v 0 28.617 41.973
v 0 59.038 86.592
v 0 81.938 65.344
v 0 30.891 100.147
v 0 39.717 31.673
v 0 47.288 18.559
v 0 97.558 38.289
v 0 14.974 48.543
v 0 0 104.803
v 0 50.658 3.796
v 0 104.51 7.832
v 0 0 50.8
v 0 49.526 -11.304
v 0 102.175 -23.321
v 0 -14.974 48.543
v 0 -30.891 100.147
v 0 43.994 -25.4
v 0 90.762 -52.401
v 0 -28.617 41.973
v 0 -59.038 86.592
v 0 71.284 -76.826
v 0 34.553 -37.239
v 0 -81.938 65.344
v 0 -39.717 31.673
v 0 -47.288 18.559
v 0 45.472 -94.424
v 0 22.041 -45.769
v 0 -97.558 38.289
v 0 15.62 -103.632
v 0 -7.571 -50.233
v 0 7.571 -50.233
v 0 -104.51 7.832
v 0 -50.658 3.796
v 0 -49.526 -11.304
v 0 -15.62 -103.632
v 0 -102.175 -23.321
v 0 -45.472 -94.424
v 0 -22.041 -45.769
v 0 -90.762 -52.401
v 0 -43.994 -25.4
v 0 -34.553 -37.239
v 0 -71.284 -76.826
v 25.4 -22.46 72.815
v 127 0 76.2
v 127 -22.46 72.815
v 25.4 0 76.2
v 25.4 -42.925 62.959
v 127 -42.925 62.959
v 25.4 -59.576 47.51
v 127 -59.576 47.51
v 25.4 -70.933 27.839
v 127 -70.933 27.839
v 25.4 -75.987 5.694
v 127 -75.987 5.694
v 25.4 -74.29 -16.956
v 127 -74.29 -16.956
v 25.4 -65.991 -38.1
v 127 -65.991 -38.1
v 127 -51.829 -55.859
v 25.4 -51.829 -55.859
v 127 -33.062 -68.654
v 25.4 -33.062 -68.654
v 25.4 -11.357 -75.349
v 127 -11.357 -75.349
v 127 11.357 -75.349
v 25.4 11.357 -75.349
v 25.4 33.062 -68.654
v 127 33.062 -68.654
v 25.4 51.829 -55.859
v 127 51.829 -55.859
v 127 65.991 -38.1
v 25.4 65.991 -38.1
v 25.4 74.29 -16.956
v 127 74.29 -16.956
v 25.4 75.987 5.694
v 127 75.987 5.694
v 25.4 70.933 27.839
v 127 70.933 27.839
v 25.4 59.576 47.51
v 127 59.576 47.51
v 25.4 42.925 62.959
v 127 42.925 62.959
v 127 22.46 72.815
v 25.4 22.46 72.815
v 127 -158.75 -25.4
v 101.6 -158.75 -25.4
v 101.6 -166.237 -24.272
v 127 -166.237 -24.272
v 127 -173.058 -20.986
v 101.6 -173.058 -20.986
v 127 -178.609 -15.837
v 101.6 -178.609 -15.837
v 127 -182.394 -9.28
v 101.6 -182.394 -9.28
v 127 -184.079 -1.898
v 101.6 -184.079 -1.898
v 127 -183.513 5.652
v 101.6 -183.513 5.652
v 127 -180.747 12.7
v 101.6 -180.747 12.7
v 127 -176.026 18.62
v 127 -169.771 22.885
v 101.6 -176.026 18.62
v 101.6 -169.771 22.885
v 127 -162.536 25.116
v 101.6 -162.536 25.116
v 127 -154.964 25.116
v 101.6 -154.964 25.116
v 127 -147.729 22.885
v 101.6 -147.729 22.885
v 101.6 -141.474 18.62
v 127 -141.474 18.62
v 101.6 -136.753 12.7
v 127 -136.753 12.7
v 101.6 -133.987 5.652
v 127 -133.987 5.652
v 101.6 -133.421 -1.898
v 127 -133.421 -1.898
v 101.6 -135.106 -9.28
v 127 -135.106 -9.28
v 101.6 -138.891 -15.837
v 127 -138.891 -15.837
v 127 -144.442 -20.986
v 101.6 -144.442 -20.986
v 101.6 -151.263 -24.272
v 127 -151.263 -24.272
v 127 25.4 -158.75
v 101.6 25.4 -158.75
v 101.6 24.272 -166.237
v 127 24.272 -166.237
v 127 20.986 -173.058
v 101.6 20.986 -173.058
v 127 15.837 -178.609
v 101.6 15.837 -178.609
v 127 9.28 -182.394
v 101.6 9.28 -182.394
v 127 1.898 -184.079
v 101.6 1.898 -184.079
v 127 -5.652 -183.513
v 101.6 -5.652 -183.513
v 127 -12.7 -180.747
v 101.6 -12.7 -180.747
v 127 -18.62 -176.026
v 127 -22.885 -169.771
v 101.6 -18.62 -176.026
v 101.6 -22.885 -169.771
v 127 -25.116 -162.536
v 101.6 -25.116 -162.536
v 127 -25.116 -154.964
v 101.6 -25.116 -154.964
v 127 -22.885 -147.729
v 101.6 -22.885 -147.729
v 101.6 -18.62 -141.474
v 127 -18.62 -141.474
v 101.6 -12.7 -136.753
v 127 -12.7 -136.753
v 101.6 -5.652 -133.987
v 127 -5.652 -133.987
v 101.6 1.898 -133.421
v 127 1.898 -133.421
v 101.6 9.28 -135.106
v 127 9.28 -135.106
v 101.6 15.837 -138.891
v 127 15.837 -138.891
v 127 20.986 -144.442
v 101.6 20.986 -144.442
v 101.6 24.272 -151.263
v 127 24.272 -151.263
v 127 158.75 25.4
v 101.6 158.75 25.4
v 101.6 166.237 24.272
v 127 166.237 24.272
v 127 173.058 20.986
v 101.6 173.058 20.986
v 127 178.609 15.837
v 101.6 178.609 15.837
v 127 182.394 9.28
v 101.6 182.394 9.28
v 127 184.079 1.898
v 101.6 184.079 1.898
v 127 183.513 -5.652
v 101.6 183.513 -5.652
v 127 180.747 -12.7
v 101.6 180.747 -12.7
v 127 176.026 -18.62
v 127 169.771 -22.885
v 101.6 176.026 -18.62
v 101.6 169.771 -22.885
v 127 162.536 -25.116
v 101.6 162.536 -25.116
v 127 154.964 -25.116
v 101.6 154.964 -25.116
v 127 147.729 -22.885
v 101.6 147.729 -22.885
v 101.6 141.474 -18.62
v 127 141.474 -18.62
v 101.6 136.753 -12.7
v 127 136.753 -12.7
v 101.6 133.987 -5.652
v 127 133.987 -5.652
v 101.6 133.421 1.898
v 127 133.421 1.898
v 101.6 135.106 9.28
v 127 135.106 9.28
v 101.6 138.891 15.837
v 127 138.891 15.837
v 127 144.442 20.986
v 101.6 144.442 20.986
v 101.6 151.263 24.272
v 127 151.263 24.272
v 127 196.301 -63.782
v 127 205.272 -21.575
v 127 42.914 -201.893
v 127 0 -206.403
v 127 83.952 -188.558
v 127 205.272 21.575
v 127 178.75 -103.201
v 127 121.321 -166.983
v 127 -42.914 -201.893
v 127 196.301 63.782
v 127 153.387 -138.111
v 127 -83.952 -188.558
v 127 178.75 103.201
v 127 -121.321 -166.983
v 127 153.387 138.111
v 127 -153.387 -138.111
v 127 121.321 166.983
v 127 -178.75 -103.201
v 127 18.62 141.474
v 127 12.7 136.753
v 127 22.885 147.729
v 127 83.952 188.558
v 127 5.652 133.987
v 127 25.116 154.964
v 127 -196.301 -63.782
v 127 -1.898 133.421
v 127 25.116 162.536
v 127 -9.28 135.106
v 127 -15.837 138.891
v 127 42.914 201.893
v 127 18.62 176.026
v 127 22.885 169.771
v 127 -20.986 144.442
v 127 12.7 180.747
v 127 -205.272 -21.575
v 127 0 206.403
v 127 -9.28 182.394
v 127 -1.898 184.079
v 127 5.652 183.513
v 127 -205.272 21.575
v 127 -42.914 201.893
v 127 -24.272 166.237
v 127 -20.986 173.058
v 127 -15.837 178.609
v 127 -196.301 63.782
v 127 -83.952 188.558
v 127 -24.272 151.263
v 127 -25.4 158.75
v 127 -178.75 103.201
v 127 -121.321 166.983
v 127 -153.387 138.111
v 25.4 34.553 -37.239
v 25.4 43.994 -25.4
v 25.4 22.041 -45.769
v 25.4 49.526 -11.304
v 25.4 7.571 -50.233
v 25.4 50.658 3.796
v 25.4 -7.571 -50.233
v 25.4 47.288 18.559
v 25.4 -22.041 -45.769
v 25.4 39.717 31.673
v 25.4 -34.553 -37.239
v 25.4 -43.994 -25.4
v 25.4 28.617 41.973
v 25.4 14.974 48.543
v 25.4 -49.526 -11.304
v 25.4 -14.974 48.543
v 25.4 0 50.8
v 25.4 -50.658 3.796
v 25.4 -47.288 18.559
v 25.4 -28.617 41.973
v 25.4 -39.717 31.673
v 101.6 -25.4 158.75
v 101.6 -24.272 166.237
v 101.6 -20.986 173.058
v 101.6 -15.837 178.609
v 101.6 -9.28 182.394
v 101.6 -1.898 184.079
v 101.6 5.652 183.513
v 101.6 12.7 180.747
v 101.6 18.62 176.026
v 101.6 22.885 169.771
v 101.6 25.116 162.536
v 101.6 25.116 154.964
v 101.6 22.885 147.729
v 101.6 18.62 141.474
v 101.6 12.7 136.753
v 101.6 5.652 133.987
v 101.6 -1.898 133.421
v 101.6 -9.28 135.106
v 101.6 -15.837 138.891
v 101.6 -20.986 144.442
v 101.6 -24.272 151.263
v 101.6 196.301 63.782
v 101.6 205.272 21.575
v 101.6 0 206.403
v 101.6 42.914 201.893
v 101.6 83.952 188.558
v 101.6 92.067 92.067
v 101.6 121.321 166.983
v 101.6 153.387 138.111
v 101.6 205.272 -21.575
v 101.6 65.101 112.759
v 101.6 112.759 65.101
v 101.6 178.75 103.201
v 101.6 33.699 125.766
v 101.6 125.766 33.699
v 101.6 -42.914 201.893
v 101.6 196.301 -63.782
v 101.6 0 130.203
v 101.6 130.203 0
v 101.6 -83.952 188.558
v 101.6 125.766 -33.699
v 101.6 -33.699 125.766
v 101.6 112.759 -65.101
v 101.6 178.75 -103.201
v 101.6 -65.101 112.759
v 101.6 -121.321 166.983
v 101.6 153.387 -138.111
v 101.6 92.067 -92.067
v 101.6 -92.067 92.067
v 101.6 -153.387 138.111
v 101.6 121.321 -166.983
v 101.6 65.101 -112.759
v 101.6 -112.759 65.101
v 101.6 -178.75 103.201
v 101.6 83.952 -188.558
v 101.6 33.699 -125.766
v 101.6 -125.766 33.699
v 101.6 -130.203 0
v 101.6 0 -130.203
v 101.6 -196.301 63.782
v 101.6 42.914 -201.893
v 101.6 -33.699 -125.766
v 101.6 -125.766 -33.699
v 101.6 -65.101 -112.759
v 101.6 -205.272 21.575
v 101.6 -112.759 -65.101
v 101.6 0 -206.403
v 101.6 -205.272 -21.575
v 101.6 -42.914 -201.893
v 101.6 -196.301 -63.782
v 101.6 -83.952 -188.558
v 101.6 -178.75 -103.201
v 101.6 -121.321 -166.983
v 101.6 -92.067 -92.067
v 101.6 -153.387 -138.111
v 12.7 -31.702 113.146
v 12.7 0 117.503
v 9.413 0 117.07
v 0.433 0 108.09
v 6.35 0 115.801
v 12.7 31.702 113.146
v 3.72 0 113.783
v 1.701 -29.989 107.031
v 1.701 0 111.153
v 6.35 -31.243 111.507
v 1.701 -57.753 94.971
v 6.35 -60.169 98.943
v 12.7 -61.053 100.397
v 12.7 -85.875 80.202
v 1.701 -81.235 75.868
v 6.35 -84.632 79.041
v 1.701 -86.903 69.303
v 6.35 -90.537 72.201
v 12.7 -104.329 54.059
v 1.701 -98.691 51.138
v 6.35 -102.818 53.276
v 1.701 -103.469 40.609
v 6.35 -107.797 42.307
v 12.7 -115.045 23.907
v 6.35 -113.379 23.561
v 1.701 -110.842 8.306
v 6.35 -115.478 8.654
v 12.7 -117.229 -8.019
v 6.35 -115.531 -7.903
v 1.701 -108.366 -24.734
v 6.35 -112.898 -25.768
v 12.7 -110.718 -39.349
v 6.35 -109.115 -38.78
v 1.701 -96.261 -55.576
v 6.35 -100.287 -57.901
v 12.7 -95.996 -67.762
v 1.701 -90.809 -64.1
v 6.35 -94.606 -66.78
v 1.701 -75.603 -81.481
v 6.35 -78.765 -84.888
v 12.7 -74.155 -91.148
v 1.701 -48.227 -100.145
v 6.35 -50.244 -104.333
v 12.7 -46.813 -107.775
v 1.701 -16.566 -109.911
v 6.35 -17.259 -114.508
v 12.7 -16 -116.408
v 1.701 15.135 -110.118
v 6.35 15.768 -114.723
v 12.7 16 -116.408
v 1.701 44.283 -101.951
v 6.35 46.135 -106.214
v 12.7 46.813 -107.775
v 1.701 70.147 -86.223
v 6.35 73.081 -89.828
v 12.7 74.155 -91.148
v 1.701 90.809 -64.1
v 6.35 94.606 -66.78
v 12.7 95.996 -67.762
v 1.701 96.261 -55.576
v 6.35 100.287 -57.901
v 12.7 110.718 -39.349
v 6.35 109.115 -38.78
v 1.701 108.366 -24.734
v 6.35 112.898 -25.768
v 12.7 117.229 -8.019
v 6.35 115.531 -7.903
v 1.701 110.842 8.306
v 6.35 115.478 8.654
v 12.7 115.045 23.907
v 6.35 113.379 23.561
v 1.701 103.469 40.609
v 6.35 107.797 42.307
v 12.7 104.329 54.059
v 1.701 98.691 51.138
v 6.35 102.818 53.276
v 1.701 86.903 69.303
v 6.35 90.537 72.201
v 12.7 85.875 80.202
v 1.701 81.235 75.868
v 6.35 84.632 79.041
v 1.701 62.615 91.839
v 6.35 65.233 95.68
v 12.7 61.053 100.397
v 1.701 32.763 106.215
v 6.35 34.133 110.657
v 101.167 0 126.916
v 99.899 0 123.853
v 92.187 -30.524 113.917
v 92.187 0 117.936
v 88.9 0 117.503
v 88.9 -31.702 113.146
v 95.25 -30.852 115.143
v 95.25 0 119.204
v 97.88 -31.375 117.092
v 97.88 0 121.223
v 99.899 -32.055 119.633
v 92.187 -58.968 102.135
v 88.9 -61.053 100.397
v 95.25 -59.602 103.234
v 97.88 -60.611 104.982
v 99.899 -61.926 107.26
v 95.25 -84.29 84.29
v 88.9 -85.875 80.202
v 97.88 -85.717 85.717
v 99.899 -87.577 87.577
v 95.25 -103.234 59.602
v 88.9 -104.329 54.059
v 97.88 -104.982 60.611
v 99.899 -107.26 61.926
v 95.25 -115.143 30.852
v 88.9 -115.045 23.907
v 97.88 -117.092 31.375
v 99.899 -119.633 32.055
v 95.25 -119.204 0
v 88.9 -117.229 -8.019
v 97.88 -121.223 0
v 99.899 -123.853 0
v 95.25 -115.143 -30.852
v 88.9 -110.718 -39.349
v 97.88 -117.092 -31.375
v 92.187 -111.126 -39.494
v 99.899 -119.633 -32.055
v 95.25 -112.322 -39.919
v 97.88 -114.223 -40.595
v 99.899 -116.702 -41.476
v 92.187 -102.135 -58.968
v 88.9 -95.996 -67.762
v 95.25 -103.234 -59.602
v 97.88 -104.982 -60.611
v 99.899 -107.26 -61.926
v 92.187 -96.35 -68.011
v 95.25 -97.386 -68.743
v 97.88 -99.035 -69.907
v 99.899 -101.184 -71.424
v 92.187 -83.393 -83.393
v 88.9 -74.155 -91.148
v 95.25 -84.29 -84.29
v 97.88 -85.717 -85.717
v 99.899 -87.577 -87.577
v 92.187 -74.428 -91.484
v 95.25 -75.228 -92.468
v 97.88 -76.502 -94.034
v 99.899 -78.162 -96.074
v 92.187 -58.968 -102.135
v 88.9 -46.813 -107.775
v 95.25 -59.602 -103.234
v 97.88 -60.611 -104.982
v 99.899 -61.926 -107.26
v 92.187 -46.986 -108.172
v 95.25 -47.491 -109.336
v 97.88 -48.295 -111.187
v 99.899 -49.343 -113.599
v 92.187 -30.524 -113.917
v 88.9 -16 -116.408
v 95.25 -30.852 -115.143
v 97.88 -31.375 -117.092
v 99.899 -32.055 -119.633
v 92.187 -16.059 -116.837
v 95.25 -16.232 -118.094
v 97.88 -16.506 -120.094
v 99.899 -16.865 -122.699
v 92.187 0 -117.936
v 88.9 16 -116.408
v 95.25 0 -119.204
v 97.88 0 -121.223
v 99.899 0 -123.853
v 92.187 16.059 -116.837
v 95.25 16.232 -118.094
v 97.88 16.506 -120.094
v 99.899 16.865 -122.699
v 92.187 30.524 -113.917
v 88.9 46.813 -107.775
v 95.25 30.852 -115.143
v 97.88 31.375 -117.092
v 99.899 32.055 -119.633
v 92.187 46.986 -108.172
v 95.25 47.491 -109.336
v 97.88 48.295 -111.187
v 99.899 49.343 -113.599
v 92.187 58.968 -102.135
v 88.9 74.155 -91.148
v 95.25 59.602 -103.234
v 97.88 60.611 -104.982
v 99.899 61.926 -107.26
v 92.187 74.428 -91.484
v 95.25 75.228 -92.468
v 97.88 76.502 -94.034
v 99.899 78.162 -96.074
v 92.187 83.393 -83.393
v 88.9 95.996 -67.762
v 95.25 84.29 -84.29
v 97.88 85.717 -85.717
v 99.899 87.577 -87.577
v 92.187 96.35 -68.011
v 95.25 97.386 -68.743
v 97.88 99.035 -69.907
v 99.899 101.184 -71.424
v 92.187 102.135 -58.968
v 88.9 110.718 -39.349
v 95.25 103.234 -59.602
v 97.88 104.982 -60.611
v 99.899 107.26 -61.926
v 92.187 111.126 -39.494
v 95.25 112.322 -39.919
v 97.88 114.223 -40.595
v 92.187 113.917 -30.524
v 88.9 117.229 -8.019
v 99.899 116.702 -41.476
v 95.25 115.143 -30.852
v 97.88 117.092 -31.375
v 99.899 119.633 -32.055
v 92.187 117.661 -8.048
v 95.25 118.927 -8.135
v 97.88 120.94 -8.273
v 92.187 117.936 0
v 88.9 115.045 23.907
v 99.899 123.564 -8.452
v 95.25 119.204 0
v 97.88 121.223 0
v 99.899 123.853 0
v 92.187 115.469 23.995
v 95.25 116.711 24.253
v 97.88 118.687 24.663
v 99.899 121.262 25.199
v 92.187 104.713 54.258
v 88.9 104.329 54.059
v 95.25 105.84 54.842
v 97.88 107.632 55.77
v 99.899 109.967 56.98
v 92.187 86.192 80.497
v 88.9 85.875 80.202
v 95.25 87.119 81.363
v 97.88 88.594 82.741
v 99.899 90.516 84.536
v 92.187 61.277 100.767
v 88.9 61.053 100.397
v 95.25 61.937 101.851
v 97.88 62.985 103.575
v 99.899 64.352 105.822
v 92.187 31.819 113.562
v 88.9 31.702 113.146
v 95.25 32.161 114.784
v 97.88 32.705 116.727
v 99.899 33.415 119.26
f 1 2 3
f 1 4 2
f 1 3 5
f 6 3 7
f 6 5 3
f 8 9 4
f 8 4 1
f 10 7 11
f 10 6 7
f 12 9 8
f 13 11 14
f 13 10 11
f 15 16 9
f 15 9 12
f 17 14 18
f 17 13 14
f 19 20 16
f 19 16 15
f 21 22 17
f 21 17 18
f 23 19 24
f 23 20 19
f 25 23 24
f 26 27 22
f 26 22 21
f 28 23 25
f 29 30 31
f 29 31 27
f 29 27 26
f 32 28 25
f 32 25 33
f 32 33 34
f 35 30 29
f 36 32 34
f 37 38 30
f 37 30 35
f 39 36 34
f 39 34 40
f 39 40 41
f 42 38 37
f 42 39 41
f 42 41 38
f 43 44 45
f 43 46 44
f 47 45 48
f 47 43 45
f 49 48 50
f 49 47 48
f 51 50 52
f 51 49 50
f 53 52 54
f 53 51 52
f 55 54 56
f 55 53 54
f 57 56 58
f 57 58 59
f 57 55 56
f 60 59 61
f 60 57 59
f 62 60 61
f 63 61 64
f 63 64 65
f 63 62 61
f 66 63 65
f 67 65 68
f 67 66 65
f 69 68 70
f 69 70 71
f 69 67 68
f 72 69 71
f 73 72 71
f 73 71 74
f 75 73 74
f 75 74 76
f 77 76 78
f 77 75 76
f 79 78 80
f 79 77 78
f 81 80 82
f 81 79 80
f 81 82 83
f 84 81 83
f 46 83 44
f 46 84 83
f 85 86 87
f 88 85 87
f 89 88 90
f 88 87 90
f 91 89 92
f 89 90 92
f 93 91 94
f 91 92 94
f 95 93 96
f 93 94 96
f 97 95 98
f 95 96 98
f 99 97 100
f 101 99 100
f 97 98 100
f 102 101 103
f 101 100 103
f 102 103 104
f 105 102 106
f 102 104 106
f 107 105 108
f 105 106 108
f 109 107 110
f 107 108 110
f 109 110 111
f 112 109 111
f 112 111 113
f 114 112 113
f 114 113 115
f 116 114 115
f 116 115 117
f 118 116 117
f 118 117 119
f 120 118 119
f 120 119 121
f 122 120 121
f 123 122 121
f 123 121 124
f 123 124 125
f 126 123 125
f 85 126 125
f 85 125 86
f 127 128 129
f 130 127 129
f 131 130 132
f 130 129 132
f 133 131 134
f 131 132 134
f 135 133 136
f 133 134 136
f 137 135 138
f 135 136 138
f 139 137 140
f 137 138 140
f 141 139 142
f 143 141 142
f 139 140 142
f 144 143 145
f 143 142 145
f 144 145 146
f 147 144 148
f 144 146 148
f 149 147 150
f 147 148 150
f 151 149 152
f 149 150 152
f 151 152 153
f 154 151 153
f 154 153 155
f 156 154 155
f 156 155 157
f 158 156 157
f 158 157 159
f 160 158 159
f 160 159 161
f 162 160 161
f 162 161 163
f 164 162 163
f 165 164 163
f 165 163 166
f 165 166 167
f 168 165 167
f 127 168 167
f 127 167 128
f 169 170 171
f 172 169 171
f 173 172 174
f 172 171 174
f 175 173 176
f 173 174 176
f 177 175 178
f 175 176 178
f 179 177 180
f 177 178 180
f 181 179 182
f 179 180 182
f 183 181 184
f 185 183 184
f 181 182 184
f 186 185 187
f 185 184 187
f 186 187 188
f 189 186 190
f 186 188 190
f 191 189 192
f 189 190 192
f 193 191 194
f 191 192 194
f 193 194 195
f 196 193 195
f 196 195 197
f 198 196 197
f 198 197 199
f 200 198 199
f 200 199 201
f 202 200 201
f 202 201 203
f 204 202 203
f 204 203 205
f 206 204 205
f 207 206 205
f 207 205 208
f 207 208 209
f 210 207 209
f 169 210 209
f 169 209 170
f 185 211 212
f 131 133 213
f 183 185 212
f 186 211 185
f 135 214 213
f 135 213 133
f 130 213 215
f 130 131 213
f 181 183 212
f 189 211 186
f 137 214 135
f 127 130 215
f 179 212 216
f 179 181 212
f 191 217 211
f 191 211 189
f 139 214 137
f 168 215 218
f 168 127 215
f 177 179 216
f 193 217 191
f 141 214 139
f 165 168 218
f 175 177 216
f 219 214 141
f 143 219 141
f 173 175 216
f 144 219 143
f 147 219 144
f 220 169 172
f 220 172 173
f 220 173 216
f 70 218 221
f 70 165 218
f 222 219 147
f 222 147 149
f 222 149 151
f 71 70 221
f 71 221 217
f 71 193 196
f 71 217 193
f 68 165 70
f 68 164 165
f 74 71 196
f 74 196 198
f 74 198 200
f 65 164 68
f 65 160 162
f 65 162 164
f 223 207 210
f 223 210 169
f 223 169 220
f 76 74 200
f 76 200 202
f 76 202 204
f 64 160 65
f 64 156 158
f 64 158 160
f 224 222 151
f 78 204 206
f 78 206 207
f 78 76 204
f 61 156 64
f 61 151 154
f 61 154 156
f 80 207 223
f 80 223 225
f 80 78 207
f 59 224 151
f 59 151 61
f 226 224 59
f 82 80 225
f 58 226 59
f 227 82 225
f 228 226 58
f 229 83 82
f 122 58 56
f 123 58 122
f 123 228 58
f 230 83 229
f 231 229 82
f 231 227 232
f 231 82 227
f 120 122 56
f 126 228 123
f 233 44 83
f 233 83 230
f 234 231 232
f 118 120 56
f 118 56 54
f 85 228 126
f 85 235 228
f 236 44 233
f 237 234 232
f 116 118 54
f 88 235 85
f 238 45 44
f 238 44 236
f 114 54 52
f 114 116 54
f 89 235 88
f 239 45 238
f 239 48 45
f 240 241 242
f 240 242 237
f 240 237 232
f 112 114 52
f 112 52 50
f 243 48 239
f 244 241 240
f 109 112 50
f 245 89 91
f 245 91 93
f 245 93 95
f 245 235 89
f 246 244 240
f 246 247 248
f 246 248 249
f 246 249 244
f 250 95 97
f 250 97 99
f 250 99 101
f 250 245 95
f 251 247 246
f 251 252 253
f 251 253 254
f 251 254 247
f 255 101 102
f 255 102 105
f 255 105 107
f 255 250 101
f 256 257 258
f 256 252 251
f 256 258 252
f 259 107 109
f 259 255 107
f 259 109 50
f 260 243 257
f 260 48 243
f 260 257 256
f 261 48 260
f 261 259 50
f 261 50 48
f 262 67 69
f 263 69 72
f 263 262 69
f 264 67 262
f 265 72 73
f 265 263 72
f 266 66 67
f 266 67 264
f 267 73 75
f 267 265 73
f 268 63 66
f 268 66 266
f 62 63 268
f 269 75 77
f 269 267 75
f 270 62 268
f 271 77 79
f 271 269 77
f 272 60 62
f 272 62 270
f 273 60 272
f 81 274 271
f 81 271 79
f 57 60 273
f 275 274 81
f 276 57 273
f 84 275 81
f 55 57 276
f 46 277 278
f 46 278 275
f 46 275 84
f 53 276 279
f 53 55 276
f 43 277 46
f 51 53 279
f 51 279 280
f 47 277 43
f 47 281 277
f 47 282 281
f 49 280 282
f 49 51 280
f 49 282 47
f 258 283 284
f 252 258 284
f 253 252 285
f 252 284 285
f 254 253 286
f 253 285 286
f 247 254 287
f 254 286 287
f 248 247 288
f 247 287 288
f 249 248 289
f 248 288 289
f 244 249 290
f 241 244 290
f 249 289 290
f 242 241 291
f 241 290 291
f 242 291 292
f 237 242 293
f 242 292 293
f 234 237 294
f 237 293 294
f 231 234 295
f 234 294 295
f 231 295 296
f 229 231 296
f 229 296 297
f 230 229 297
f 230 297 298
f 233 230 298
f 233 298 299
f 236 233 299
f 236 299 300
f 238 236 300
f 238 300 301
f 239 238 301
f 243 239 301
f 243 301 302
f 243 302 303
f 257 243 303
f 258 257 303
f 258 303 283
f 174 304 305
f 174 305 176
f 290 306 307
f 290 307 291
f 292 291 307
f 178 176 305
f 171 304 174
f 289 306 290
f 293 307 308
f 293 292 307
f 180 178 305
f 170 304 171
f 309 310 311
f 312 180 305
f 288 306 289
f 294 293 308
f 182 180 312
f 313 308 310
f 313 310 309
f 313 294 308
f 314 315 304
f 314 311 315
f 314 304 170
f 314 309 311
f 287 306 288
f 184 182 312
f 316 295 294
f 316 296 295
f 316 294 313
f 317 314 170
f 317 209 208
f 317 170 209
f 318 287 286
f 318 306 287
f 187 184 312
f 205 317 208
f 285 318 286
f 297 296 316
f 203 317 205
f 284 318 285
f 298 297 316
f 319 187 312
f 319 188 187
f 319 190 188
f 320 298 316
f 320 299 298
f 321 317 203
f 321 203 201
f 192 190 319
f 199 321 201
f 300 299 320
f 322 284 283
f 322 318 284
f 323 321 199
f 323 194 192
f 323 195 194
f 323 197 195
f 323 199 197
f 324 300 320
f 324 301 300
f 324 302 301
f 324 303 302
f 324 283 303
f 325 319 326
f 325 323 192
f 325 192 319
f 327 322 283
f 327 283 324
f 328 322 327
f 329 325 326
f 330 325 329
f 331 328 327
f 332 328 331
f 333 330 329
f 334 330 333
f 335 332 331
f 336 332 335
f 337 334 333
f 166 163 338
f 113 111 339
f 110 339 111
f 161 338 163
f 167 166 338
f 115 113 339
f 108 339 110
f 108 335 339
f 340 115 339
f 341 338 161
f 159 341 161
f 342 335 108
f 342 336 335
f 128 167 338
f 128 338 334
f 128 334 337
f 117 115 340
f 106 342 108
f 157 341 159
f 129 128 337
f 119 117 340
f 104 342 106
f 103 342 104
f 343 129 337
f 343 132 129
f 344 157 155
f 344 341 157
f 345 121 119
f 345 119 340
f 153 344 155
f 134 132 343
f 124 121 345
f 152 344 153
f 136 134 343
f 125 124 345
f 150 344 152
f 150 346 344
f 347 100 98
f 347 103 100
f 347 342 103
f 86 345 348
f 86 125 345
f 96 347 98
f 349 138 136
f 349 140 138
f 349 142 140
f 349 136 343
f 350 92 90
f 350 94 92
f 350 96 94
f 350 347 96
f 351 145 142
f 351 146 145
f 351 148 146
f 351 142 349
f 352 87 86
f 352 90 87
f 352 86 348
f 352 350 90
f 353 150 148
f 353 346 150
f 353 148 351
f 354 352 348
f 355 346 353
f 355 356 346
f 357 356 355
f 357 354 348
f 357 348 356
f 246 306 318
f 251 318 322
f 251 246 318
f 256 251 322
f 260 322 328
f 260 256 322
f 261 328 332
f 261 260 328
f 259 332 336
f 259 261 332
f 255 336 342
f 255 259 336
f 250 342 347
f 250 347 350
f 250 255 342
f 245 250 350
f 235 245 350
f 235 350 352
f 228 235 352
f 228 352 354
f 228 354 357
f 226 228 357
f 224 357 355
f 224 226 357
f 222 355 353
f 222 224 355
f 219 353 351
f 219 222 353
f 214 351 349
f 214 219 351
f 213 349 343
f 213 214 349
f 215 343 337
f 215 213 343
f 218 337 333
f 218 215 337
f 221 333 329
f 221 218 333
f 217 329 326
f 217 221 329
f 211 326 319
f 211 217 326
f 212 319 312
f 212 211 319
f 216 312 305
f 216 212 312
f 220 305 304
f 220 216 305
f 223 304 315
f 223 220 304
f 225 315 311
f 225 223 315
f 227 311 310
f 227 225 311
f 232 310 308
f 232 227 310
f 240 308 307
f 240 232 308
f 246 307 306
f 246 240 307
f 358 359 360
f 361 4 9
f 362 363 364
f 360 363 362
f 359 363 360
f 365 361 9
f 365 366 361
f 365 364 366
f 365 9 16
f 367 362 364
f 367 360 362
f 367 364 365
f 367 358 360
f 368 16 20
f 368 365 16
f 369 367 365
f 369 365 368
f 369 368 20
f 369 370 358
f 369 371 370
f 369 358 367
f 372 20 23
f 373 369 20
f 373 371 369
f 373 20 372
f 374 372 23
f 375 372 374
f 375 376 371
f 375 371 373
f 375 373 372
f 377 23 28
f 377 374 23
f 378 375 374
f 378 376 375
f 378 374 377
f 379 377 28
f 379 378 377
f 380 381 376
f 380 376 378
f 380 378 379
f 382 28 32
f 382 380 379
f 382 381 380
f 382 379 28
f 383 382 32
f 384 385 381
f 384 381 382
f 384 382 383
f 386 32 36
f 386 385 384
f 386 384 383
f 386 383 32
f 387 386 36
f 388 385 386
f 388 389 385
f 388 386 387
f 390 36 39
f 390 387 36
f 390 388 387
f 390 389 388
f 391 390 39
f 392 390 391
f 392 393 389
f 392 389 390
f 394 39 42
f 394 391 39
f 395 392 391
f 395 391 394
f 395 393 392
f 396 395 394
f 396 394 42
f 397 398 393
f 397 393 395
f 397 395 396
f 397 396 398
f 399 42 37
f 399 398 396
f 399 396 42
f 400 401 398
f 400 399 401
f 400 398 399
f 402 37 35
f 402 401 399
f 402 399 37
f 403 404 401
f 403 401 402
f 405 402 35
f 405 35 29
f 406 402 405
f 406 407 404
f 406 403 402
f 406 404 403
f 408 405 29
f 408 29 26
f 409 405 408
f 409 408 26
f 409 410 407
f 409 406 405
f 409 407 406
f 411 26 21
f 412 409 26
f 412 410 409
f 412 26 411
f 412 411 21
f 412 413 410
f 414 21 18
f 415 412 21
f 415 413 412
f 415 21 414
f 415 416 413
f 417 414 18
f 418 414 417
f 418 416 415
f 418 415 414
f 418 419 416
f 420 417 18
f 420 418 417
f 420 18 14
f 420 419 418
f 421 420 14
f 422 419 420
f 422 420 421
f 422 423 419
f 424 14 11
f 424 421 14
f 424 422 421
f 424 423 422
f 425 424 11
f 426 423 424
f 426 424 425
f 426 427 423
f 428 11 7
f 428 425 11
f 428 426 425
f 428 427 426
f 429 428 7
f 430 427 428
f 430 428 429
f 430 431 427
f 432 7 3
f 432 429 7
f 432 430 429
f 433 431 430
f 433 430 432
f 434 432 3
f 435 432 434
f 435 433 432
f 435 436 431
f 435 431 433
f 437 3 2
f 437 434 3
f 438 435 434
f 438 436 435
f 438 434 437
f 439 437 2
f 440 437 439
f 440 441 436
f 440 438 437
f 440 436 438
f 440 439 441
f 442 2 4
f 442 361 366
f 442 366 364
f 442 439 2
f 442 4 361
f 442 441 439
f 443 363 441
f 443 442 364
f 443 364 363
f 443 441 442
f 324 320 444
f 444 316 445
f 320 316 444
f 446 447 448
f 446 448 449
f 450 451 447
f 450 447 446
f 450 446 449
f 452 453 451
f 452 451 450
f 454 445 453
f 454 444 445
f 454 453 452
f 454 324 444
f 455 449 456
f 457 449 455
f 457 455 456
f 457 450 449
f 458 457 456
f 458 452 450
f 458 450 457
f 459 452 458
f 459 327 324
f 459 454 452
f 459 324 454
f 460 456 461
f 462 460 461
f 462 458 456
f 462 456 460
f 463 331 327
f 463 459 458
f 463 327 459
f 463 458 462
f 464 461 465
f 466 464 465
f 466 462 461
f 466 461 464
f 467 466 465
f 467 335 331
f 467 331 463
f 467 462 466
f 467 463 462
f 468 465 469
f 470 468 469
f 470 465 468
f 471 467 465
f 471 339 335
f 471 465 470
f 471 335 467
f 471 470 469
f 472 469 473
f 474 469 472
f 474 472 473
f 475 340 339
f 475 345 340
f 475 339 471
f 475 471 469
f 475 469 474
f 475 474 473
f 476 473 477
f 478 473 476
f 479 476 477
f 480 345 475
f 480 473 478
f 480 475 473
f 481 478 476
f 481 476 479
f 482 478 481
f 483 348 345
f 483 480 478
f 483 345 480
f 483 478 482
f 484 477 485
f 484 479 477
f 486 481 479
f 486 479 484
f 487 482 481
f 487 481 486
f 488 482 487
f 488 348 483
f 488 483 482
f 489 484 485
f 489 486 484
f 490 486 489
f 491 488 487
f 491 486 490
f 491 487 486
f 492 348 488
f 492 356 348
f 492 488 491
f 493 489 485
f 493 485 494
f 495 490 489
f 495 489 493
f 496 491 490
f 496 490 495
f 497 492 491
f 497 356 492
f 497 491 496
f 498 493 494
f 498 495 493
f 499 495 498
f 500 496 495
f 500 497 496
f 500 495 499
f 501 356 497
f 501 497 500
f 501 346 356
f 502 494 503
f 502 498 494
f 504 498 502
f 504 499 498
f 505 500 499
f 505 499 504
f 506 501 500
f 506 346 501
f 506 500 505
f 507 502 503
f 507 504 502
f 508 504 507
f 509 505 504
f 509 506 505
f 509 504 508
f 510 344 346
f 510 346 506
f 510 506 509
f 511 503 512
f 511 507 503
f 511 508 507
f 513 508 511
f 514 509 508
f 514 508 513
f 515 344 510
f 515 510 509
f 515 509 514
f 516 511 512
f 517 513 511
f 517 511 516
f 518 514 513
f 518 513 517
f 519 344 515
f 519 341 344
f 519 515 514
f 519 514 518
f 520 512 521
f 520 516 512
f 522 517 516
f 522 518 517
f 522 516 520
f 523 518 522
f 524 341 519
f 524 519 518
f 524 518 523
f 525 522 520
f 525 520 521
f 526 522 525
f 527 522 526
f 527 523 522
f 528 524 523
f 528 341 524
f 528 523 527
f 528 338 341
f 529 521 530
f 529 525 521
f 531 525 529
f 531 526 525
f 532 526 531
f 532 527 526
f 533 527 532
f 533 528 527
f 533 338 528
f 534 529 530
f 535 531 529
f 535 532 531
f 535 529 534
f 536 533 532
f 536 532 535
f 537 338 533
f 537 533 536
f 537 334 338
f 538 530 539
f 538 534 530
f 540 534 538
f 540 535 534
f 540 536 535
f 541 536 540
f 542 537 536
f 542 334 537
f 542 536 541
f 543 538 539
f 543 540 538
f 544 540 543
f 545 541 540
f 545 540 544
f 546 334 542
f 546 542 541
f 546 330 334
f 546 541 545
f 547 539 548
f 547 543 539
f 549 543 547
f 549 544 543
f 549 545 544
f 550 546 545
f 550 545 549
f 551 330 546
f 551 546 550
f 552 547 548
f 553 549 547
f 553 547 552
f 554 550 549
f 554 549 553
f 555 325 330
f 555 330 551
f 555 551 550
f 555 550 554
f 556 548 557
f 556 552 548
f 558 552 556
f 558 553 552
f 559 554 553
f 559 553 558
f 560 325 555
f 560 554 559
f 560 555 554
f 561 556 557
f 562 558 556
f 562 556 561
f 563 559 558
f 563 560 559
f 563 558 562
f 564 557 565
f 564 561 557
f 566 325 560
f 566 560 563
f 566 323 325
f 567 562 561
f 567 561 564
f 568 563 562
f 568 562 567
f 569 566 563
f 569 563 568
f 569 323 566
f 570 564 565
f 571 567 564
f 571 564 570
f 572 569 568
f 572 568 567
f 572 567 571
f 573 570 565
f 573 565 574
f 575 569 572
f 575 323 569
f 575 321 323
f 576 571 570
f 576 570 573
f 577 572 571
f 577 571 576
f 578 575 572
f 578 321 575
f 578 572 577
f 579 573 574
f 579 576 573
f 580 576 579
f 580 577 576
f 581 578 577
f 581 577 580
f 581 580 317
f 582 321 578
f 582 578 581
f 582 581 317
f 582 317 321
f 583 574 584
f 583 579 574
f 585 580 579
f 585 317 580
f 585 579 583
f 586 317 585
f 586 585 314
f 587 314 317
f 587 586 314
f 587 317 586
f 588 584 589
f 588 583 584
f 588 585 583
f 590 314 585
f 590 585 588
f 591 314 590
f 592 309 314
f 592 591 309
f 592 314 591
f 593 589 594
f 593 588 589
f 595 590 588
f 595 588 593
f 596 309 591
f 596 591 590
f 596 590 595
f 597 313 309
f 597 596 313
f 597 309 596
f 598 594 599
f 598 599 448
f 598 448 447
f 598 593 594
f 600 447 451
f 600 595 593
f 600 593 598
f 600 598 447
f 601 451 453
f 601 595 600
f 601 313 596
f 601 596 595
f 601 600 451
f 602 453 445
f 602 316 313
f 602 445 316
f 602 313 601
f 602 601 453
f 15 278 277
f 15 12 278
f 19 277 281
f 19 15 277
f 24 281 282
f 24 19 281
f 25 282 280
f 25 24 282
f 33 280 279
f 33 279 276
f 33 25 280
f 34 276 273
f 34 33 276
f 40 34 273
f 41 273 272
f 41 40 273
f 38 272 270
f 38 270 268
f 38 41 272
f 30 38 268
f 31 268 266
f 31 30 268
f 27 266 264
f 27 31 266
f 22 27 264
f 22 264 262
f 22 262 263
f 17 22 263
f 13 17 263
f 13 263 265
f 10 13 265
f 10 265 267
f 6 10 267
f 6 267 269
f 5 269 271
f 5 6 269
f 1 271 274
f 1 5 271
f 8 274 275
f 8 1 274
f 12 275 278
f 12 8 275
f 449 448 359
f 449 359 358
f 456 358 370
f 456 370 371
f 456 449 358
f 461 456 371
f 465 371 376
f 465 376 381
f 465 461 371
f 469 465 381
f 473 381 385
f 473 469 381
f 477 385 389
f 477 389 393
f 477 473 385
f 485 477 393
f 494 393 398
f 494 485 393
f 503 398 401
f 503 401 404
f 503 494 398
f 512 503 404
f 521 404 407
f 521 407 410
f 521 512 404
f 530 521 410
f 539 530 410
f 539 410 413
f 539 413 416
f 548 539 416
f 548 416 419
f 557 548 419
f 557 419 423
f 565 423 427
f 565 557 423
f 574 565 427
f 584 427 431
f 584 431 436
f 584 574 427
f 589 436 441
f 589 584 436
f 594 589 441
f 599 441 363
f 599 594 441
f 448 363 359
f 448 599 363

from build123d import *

# Parameters (mm, degrees)
SKETCH5_R          = 25.4
CUT_EXTRUDE1_DEPTH = 310.07425534
CIRPATTERN1_COUNT  = 4
FILLET1_R          = 12.7


with BuildPart() as part:
    # Sketch1 → Revolve6 (revolve)
    with BuildSketch(Plane(origin=(0, 0, 0), x_dir=(1, 0, 0), z_dir=(0, 1, 0)), mode=Mode.PRIVATE) as revolve6_sk:
        Polygon((0, 50.8), (0, 117.502925505), (101.6, 117.502925505), (101.6, 206.402925505), (127, 206.402925505), (127, 76.2), (25.4, 76.2), (25.4, 50.8), align=None)
    revolve(revolve6_sk.sketch.rotate(Axis((-155.979583507, 0, 0), (1, 0, 0)), 180), axis=Axis((-155.979583507, 0, 0), (1, 0, 0)))

    # Sketch5 → Cut-Extrude1 (cut, through all)
    with BuildSketch(Plane.ZY.offset(-101.6)):
        with Locations((0, 158.75)):
            Circle(SKETCH5_R)
    cut_extrude1 = extrude(amount=-CUT_EXTRUDE1_DEPTH, mode=Mode.SUBTRACT)

    # CirPattern1: Cut-Extrude1 ×4 about axis
    cirpattern1_axis = Axis((0, 0, 0), (1, 0, 0))
    for i in range(1, CIRPATTERN1_COUNT):
        add(cut_extrude1.rotate(cirpattern1_axis, i * 360 / CIRPATTERN1_COUNT), mode=Mode.SUBTRACT)

    # Fillet1
    fillet1_edges = [part.edges().sort_by_distance(p)[0] for p in [
        (0, 0, -117.502925505),
        (101.6, 0, -117.502925505),
    ]]
    fillet(fillet1_edges, radius=FILLET1_R)


solid = part.part
